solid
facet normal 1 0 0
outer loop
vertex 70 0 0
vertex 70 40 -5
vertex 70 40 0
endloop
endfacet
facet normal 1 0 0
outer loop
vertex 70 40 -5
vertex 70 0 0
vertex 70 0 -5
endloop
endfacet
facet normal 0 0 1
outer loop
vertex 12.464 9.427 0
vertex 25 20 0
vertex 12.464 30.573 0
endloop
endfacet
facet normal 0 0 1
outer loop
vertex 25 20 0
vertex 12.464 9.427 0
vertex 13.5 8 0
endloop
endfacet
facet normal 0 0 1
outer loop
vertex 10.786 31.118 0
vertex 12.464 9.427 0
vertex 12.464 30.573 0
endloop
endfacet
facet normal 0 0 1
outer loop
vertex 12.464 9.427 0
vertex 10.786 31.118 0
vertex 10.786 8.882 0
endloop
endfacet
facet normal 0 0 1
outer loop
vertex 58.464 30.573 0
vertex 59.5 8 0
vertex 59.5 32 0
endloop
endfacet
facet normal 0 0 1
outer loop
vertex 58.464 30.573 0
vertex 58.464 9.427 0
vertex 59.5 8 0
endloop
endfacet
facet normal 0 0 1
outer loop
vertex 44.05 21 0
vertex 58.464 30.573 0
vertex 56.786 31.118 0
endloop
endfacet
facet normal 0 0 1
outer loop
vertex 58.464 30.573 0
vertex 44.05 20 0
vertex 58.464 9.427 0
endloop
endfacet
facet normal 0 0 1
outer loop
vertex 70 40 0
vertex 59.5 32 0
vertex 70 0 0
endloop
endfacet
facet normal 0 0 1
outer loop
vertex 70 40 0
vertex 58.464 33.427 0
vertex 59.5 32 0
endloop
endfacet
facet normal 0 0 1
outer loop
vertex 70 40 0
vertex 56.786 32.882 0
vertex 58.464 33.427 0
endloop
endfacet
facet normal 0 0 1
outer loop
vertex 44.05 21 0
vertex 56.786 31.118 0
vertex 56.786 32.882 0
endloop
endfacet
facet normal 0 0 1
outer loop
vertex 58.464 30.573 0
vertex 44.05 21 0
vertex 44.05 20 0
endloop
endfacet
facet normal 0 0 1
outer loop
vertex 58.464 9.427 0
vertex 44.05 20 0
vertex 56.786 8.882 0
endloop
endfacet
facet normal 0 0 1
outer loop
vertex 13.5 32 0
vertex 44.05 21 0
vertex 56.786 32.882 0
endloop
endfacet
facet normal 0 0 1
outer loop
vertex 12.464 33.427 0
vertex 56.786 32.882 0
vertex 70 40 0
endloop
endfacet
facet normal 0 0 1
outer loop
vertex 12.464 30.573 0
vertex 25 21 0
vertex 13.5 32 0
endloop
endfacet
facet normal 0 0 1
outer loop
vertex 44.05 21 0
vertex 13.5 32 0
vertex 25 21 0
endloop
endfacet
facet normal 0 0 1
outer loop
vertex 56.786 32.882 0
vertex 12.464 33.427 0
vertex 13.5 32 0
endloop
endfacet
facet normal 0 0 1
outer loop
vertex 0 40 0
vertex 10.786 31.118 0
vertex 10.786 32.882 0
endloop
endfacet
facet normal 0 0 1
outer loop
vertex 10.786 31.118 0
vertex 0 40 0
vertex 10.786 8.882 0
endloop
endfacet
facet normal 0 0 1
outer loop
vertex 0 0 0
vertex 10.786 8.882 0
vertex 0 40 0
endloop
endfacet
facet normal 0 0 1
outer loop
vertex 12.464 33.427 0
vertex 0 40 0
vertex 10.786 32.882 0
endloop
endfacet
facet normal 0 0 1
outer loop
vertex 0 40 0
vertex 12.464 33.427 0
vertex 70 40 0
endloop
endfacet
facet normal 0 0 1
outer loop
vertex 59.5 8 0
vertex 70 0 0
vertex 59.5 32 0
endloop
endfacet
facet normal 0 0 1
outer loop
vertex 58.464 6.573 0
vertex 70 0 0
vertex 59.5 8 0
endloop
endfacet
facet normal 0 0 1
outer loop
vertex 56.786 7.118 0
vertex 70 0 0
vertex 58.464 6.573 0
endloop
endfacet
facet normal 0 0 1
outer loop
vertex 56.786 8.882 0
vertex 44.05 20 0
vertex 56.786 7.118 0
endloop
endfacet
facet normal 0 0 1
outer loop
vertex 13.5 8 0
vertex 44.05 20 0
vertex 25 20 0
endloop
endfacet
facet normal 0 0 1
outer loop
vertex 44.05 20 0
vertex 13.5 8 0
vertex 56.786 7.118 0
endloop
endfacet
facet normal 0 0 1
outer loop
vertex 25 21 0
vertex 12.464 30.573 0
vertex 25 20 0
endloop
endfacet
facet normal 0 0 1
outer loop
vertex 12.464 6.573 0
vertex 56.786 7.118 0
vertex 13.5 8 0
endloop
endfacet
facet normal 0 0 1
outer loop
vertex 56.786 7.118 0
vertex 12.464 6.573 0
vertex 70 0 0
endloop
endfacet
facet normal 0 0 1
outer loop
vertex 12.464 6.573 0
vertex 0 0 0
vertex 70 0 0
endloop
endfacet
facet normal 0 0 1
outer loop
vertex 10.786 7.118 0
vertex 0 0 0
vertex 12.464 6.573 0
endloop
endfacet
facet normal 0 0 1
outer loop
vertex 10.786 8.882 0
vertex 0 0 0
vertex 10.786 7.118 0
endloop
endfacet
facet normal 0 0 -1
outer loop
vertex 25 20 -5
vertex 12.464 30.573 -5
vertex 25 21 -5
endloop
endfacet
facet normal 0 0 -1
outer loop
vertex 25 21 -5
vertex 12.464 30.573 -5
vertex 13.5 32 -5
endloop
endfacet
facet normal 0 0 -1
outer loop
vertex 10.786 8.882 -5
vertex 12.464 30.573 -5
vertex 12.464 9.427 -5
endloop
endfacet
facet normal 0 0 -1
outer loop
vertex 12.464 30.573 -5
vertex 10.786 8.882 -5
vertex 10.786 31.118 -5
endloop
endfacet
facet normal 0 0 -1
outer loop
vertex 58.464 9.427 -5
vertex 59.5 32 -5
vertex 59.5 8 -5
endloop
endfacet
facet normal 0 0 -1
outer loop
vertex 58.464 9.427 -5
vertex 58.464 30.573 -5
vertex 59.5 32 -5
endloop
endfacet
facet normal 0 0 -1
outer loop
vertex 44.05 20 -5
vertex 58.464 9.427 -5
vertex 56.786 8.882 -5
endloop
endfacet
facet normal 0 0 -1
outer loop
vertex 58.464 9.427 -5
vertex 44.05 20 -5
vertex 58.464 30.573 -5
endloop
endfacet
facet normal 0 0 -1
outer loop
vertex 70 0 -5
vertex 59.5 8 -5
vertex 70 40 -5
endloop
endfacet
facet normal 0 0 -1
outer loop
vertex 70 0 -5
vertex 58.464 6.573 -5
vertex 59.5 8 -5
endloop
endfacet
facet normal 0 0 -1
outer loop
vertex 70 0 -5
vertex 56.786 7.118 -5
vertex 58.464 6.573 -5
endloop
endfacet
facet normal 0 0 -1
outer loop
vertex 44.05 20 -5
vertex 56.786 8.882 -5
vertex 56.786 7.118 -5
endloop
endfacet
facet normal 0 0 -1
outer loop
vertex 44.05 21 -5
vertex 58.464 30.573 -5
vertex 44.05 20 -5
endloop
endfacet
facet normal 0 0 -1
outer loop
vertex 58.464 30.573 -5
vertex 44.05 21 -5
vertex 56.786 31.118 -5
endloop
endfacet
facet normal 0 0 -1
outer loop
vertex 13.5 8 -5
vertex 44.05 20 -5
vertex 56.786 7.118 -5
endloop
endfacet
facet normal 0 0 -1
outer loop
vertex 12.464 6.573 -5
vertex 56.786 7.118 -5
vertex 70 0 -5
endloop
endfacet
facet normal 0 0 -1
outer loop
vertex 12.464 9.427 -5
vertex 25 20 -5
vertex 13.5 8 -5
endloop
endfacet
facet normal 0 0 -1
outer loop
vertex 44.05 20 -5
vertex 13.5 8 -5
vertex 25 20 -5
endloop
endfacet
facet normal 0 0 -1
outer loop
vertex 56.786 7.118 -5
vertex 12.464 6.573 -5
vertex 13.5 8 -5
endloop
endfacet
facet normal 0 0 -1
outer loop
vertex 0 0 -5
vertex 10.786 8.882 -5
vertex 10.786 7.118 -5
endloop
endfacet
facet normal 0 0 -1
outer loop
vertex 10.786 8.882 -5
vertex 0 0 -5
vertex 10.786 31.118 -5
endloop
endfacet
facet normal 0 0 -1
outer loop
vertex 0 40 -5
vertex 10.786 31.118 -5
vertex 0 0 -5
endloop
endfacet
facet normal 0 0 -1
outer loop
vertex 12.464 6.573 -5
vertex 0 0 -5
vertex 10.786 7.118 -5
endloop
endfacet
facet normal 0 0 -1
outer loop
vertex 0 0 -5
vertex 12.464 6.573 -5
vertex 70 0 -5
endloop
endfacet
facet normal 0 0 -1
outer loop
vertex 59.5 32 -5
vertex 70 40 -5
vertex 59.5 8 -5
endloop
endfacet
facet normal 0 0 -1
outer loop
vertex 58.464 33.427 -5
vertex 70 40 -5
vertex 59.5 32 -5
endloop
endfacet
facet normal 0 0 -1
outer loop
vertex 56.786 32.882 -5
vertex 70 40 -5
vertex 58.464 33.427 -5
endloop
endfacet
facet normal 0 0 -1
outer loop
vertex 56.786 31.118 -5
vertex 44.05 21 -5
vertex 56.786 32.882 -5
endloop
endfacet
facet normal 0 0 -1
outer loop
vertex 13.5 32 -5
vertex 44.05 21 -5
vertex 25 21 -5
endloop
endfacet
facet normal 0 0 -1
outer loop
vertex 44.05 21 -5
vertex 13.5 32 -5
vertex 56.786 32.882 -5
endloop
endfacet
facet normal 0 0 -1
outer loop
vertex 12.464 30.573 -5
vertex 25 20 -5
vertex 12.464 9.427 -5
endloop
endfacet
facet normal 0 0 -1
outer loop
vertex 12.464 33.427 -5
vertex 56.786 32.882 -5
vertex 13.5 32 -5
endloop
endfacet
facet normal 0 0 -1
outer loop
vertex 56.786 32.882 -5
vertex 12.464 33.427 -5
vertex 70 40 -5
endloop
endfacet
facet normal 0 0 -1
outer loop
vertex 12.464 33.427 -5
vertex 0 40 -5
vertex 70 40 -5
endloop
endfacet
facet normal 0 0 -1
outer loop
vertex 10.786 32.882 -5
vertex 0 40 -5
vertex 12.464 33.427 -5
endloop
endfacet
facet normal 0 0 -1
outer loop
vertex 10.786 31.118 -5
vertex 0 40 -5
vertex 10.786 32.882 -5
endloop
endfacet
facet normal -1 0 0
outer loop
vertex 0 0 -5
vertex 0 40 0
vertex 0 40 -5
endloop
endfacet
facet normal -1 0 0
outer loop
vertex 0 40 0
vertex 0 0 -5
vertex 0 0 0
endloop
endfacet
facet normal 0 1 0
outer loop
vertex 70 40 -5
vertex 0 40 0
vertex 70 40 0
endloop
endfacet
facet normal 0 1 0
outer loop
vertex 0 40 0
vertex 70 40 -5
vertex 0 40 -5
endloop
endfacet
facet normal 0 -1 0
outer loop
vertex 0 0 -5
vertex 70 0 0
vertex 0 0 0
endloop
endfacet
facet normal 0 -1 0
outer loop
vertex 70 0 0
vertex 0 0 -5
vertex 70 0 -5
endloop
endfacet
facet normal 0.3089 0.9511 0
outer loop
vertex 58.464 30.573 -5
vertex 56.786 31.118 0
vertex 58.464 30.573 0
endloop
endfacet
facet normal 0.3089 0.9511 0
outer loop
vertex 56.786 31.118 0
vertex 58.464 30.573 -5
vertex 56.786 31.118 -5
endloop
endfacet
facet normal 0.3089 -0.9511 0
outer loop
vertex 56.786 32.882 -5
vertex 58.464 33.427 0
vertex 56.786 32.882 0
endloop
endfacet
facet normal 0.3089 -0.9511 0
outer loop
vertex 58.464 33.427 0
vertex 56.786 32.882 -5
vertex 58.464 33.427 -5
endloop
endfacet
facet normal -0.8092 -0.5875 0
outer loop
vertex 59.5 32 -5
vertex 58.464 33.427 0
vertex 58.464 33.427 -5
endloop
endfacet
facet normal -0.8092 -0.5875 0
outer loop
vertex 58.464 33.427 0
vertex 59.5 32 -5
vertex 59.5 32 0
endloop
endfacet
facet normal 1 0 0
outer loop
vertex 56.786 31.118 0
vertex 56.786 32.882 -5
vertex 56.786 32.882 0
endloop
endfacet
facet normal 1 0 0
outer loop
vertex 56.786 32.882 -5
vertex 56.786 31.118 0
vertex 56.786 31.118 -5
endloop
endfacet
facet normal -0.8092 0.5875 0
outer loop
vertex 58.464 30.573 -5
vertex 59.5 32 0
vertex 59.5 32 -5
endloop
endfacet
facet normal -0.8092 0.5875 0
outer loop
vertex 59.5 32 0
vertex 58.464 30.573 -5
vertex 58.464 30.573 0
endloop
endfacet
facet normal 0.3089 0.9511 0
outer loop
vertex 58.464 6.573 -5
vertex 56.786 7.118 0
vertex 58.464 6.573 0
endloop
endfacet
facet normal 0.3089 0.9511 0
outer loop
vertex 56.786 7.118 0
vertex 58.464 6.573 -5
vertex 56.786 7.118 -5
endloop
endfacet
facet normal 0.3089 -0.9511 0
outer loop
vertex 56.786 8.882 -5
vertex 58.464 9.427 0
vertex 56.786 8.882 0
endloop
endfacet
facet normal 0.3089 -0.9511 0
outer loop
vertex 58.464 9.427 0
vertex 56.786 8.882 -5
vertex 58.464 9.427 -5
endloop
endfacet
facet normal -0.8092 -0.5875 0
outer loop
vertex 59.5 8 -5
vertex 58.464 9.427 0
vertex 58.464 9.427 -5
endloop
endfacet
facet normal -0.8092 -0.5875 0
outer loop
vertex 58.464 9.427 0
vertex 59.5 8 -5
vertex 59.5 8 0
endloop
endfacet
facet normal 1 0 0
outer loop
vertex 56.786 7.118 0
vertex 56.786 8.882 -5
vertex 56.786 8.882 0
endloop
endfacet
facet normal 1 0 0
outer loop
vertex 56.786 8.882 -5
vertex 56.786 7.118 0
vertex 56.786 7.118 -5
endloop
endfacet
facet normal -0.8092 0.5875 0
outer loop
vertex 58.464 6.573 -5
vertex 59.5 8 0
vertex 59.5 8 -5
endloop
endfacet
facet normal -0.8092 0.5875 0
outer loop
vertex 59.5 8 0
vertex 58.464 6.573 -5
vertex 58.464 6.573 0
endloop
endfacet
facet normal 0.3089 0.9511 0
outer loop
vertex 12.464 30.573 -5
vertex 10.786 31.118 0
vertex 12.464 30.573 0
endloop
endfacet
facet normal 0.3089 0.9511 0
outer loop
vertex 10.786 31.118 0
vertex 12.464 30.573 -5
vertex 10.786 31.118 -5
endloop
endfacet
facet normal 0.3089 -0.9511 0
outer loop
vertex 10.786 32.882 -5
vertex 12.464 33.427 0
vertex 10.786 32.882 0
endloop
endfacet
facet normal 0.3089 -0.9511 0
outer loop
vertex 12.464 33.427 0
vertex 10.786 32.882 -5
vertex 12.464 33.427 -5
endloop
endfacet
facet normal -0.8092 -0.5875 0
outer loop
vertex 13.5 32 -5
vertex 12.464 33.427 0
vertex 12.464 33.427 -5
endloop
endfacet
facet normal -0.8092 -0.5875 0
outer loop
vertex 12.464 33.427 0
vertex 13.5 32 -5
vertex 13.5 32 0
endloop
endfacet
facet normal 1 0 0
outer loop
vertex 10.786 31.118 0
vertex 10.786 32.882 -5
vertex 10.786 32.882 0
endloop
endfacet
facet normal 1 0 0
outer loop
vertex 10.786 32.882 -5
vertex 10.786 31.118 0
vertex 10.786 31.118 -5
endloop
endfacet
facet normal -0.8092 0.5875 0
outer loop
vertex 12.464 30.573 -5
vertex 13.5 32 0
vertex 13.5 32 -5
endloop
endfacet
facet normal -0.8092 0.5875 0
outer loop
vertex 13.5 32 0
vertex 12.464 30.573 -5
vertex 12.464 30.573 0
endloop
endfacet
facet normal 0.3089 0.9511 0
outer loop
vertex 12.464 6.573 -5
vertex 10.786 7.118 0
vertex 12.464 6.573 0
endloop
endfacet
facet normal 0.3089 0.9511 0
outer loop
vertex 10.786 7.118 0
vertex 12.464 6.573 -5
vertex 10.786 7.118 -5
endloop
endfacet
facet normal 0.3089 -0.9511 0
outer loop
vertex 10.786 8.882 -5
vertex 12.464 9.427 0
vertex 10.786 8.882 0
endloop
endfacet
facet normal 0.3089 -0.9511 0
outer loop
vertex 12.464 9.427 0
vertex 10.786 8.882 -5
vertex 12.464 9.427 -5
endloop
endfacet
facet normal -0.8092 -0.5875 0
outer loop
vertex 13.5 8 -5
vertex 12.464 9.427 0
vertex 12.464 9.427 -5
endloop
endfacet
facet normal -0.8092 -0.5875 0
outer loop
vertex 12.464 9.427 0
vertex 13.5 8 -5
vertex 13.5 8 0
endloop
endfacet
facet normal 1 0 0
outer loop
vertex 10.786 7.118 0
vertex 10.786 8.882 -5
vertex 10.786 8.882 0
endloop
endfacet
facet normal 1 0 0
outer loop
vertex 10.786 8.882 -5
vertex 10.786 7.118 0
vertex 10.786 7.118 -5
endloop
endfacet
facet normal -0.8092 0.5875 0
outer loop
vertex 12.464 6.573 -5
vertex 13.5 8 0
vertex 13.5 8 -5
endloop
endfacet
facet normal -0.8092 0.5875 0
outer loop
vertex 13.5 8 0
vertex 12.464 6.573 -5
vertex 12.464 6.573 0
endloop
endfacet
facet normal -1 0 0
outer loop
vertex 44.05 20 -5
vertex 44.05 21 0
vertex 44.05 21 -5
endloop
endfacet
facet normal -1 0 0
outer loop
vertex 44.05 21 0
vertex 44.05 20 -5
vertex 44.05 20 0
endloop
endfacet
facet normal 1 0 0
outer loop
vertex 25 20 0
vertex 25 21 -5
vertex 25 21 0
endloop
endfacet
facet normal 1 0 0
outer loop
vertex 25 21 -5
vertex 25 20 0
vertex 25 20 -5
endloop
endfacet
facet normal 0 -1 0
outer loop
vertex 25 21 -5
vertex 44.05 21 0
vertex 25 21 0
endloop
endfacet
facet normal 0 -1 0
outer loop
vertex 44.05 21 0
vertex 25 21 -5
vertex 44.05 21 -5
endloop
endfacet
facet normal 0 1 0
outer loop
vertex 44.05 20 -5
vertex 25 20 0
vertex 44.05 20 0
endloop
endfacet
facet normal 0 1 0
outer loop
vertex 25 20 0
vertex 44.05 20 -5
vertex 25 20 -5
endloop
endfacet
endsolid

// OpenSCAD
//test code
//block no args
//belt_block();

//cap args block_length, block_width, thickness, bolt_inset, bolt
splitter_cap(70, 40, 5, 12, 3);


//modules that make it happen

module razor(block_length, block_width)
{
translate([block_length/2-10,block_width/2,-40])
#cube ([19.05, 1, 80], center = "true");
}

module belt_block()
{
belt_width = 12.7;
belt_thick = 3;
block_width = 40;
block_length = 70;
bolt_inset = 12;
bolt = 3;
thickness = 15;

difference()
{
	//basic block
	cube([block_length, block_width, thickness], center="true");
	
	//belt cutout
	translate([0, block_width/2-belt_width/2, 0])
		cube([90, belt_width, belt_thick], center="true"); 

	//bolts holding it all together
	translate([block_length-bolt_inset,4*block_width/5,-20])
	#cylinder(r=bolt/2, h=70, center= "true");

	translate([block_length-bolt_inset,block_width/5,-20])
	#cylinder(r=bolt/2, h=70, center= "true");

	translate([bolt_inset,4*block_width/5,-20])
	#cylinder(r=bolt/2, h=70, center= "true");

	translate([bolt_inset,block_width/5,-20])
	#cylinder(r=bolt/2, h=70, center= "true");

	//slot for razor
	razor(block_length, block_width);

}
}
module splitter_cap (block_length, block_width, thickness, bolt_inset, bolt)
{
translate([0,0,-thickness])
difference()
{
	//basic block
	cube([block_length, block_width, thickness], center="true");
	
	//bolts holding it all together
	translate([block_length-bolt_inset,4*block_width/5,-20])
	#cylinder(r=bolt/2, h=70, center= "true");

	translate([block_length-bolt_inset,block_width/5,-20])
	#cylinder(r=bolt/2, h=70, center= "true");

	translate([bolt_inset,4*block_width/5,-20])
	#cylinder(r=bolt/2, h=70, center= "true");

	translate([bolt_inset,block_width/5,-20])
	#cylinder(r=bolt/2, h=70, center= "true");

	//slot for razor
	razor(block_length, block_width);

}
}
